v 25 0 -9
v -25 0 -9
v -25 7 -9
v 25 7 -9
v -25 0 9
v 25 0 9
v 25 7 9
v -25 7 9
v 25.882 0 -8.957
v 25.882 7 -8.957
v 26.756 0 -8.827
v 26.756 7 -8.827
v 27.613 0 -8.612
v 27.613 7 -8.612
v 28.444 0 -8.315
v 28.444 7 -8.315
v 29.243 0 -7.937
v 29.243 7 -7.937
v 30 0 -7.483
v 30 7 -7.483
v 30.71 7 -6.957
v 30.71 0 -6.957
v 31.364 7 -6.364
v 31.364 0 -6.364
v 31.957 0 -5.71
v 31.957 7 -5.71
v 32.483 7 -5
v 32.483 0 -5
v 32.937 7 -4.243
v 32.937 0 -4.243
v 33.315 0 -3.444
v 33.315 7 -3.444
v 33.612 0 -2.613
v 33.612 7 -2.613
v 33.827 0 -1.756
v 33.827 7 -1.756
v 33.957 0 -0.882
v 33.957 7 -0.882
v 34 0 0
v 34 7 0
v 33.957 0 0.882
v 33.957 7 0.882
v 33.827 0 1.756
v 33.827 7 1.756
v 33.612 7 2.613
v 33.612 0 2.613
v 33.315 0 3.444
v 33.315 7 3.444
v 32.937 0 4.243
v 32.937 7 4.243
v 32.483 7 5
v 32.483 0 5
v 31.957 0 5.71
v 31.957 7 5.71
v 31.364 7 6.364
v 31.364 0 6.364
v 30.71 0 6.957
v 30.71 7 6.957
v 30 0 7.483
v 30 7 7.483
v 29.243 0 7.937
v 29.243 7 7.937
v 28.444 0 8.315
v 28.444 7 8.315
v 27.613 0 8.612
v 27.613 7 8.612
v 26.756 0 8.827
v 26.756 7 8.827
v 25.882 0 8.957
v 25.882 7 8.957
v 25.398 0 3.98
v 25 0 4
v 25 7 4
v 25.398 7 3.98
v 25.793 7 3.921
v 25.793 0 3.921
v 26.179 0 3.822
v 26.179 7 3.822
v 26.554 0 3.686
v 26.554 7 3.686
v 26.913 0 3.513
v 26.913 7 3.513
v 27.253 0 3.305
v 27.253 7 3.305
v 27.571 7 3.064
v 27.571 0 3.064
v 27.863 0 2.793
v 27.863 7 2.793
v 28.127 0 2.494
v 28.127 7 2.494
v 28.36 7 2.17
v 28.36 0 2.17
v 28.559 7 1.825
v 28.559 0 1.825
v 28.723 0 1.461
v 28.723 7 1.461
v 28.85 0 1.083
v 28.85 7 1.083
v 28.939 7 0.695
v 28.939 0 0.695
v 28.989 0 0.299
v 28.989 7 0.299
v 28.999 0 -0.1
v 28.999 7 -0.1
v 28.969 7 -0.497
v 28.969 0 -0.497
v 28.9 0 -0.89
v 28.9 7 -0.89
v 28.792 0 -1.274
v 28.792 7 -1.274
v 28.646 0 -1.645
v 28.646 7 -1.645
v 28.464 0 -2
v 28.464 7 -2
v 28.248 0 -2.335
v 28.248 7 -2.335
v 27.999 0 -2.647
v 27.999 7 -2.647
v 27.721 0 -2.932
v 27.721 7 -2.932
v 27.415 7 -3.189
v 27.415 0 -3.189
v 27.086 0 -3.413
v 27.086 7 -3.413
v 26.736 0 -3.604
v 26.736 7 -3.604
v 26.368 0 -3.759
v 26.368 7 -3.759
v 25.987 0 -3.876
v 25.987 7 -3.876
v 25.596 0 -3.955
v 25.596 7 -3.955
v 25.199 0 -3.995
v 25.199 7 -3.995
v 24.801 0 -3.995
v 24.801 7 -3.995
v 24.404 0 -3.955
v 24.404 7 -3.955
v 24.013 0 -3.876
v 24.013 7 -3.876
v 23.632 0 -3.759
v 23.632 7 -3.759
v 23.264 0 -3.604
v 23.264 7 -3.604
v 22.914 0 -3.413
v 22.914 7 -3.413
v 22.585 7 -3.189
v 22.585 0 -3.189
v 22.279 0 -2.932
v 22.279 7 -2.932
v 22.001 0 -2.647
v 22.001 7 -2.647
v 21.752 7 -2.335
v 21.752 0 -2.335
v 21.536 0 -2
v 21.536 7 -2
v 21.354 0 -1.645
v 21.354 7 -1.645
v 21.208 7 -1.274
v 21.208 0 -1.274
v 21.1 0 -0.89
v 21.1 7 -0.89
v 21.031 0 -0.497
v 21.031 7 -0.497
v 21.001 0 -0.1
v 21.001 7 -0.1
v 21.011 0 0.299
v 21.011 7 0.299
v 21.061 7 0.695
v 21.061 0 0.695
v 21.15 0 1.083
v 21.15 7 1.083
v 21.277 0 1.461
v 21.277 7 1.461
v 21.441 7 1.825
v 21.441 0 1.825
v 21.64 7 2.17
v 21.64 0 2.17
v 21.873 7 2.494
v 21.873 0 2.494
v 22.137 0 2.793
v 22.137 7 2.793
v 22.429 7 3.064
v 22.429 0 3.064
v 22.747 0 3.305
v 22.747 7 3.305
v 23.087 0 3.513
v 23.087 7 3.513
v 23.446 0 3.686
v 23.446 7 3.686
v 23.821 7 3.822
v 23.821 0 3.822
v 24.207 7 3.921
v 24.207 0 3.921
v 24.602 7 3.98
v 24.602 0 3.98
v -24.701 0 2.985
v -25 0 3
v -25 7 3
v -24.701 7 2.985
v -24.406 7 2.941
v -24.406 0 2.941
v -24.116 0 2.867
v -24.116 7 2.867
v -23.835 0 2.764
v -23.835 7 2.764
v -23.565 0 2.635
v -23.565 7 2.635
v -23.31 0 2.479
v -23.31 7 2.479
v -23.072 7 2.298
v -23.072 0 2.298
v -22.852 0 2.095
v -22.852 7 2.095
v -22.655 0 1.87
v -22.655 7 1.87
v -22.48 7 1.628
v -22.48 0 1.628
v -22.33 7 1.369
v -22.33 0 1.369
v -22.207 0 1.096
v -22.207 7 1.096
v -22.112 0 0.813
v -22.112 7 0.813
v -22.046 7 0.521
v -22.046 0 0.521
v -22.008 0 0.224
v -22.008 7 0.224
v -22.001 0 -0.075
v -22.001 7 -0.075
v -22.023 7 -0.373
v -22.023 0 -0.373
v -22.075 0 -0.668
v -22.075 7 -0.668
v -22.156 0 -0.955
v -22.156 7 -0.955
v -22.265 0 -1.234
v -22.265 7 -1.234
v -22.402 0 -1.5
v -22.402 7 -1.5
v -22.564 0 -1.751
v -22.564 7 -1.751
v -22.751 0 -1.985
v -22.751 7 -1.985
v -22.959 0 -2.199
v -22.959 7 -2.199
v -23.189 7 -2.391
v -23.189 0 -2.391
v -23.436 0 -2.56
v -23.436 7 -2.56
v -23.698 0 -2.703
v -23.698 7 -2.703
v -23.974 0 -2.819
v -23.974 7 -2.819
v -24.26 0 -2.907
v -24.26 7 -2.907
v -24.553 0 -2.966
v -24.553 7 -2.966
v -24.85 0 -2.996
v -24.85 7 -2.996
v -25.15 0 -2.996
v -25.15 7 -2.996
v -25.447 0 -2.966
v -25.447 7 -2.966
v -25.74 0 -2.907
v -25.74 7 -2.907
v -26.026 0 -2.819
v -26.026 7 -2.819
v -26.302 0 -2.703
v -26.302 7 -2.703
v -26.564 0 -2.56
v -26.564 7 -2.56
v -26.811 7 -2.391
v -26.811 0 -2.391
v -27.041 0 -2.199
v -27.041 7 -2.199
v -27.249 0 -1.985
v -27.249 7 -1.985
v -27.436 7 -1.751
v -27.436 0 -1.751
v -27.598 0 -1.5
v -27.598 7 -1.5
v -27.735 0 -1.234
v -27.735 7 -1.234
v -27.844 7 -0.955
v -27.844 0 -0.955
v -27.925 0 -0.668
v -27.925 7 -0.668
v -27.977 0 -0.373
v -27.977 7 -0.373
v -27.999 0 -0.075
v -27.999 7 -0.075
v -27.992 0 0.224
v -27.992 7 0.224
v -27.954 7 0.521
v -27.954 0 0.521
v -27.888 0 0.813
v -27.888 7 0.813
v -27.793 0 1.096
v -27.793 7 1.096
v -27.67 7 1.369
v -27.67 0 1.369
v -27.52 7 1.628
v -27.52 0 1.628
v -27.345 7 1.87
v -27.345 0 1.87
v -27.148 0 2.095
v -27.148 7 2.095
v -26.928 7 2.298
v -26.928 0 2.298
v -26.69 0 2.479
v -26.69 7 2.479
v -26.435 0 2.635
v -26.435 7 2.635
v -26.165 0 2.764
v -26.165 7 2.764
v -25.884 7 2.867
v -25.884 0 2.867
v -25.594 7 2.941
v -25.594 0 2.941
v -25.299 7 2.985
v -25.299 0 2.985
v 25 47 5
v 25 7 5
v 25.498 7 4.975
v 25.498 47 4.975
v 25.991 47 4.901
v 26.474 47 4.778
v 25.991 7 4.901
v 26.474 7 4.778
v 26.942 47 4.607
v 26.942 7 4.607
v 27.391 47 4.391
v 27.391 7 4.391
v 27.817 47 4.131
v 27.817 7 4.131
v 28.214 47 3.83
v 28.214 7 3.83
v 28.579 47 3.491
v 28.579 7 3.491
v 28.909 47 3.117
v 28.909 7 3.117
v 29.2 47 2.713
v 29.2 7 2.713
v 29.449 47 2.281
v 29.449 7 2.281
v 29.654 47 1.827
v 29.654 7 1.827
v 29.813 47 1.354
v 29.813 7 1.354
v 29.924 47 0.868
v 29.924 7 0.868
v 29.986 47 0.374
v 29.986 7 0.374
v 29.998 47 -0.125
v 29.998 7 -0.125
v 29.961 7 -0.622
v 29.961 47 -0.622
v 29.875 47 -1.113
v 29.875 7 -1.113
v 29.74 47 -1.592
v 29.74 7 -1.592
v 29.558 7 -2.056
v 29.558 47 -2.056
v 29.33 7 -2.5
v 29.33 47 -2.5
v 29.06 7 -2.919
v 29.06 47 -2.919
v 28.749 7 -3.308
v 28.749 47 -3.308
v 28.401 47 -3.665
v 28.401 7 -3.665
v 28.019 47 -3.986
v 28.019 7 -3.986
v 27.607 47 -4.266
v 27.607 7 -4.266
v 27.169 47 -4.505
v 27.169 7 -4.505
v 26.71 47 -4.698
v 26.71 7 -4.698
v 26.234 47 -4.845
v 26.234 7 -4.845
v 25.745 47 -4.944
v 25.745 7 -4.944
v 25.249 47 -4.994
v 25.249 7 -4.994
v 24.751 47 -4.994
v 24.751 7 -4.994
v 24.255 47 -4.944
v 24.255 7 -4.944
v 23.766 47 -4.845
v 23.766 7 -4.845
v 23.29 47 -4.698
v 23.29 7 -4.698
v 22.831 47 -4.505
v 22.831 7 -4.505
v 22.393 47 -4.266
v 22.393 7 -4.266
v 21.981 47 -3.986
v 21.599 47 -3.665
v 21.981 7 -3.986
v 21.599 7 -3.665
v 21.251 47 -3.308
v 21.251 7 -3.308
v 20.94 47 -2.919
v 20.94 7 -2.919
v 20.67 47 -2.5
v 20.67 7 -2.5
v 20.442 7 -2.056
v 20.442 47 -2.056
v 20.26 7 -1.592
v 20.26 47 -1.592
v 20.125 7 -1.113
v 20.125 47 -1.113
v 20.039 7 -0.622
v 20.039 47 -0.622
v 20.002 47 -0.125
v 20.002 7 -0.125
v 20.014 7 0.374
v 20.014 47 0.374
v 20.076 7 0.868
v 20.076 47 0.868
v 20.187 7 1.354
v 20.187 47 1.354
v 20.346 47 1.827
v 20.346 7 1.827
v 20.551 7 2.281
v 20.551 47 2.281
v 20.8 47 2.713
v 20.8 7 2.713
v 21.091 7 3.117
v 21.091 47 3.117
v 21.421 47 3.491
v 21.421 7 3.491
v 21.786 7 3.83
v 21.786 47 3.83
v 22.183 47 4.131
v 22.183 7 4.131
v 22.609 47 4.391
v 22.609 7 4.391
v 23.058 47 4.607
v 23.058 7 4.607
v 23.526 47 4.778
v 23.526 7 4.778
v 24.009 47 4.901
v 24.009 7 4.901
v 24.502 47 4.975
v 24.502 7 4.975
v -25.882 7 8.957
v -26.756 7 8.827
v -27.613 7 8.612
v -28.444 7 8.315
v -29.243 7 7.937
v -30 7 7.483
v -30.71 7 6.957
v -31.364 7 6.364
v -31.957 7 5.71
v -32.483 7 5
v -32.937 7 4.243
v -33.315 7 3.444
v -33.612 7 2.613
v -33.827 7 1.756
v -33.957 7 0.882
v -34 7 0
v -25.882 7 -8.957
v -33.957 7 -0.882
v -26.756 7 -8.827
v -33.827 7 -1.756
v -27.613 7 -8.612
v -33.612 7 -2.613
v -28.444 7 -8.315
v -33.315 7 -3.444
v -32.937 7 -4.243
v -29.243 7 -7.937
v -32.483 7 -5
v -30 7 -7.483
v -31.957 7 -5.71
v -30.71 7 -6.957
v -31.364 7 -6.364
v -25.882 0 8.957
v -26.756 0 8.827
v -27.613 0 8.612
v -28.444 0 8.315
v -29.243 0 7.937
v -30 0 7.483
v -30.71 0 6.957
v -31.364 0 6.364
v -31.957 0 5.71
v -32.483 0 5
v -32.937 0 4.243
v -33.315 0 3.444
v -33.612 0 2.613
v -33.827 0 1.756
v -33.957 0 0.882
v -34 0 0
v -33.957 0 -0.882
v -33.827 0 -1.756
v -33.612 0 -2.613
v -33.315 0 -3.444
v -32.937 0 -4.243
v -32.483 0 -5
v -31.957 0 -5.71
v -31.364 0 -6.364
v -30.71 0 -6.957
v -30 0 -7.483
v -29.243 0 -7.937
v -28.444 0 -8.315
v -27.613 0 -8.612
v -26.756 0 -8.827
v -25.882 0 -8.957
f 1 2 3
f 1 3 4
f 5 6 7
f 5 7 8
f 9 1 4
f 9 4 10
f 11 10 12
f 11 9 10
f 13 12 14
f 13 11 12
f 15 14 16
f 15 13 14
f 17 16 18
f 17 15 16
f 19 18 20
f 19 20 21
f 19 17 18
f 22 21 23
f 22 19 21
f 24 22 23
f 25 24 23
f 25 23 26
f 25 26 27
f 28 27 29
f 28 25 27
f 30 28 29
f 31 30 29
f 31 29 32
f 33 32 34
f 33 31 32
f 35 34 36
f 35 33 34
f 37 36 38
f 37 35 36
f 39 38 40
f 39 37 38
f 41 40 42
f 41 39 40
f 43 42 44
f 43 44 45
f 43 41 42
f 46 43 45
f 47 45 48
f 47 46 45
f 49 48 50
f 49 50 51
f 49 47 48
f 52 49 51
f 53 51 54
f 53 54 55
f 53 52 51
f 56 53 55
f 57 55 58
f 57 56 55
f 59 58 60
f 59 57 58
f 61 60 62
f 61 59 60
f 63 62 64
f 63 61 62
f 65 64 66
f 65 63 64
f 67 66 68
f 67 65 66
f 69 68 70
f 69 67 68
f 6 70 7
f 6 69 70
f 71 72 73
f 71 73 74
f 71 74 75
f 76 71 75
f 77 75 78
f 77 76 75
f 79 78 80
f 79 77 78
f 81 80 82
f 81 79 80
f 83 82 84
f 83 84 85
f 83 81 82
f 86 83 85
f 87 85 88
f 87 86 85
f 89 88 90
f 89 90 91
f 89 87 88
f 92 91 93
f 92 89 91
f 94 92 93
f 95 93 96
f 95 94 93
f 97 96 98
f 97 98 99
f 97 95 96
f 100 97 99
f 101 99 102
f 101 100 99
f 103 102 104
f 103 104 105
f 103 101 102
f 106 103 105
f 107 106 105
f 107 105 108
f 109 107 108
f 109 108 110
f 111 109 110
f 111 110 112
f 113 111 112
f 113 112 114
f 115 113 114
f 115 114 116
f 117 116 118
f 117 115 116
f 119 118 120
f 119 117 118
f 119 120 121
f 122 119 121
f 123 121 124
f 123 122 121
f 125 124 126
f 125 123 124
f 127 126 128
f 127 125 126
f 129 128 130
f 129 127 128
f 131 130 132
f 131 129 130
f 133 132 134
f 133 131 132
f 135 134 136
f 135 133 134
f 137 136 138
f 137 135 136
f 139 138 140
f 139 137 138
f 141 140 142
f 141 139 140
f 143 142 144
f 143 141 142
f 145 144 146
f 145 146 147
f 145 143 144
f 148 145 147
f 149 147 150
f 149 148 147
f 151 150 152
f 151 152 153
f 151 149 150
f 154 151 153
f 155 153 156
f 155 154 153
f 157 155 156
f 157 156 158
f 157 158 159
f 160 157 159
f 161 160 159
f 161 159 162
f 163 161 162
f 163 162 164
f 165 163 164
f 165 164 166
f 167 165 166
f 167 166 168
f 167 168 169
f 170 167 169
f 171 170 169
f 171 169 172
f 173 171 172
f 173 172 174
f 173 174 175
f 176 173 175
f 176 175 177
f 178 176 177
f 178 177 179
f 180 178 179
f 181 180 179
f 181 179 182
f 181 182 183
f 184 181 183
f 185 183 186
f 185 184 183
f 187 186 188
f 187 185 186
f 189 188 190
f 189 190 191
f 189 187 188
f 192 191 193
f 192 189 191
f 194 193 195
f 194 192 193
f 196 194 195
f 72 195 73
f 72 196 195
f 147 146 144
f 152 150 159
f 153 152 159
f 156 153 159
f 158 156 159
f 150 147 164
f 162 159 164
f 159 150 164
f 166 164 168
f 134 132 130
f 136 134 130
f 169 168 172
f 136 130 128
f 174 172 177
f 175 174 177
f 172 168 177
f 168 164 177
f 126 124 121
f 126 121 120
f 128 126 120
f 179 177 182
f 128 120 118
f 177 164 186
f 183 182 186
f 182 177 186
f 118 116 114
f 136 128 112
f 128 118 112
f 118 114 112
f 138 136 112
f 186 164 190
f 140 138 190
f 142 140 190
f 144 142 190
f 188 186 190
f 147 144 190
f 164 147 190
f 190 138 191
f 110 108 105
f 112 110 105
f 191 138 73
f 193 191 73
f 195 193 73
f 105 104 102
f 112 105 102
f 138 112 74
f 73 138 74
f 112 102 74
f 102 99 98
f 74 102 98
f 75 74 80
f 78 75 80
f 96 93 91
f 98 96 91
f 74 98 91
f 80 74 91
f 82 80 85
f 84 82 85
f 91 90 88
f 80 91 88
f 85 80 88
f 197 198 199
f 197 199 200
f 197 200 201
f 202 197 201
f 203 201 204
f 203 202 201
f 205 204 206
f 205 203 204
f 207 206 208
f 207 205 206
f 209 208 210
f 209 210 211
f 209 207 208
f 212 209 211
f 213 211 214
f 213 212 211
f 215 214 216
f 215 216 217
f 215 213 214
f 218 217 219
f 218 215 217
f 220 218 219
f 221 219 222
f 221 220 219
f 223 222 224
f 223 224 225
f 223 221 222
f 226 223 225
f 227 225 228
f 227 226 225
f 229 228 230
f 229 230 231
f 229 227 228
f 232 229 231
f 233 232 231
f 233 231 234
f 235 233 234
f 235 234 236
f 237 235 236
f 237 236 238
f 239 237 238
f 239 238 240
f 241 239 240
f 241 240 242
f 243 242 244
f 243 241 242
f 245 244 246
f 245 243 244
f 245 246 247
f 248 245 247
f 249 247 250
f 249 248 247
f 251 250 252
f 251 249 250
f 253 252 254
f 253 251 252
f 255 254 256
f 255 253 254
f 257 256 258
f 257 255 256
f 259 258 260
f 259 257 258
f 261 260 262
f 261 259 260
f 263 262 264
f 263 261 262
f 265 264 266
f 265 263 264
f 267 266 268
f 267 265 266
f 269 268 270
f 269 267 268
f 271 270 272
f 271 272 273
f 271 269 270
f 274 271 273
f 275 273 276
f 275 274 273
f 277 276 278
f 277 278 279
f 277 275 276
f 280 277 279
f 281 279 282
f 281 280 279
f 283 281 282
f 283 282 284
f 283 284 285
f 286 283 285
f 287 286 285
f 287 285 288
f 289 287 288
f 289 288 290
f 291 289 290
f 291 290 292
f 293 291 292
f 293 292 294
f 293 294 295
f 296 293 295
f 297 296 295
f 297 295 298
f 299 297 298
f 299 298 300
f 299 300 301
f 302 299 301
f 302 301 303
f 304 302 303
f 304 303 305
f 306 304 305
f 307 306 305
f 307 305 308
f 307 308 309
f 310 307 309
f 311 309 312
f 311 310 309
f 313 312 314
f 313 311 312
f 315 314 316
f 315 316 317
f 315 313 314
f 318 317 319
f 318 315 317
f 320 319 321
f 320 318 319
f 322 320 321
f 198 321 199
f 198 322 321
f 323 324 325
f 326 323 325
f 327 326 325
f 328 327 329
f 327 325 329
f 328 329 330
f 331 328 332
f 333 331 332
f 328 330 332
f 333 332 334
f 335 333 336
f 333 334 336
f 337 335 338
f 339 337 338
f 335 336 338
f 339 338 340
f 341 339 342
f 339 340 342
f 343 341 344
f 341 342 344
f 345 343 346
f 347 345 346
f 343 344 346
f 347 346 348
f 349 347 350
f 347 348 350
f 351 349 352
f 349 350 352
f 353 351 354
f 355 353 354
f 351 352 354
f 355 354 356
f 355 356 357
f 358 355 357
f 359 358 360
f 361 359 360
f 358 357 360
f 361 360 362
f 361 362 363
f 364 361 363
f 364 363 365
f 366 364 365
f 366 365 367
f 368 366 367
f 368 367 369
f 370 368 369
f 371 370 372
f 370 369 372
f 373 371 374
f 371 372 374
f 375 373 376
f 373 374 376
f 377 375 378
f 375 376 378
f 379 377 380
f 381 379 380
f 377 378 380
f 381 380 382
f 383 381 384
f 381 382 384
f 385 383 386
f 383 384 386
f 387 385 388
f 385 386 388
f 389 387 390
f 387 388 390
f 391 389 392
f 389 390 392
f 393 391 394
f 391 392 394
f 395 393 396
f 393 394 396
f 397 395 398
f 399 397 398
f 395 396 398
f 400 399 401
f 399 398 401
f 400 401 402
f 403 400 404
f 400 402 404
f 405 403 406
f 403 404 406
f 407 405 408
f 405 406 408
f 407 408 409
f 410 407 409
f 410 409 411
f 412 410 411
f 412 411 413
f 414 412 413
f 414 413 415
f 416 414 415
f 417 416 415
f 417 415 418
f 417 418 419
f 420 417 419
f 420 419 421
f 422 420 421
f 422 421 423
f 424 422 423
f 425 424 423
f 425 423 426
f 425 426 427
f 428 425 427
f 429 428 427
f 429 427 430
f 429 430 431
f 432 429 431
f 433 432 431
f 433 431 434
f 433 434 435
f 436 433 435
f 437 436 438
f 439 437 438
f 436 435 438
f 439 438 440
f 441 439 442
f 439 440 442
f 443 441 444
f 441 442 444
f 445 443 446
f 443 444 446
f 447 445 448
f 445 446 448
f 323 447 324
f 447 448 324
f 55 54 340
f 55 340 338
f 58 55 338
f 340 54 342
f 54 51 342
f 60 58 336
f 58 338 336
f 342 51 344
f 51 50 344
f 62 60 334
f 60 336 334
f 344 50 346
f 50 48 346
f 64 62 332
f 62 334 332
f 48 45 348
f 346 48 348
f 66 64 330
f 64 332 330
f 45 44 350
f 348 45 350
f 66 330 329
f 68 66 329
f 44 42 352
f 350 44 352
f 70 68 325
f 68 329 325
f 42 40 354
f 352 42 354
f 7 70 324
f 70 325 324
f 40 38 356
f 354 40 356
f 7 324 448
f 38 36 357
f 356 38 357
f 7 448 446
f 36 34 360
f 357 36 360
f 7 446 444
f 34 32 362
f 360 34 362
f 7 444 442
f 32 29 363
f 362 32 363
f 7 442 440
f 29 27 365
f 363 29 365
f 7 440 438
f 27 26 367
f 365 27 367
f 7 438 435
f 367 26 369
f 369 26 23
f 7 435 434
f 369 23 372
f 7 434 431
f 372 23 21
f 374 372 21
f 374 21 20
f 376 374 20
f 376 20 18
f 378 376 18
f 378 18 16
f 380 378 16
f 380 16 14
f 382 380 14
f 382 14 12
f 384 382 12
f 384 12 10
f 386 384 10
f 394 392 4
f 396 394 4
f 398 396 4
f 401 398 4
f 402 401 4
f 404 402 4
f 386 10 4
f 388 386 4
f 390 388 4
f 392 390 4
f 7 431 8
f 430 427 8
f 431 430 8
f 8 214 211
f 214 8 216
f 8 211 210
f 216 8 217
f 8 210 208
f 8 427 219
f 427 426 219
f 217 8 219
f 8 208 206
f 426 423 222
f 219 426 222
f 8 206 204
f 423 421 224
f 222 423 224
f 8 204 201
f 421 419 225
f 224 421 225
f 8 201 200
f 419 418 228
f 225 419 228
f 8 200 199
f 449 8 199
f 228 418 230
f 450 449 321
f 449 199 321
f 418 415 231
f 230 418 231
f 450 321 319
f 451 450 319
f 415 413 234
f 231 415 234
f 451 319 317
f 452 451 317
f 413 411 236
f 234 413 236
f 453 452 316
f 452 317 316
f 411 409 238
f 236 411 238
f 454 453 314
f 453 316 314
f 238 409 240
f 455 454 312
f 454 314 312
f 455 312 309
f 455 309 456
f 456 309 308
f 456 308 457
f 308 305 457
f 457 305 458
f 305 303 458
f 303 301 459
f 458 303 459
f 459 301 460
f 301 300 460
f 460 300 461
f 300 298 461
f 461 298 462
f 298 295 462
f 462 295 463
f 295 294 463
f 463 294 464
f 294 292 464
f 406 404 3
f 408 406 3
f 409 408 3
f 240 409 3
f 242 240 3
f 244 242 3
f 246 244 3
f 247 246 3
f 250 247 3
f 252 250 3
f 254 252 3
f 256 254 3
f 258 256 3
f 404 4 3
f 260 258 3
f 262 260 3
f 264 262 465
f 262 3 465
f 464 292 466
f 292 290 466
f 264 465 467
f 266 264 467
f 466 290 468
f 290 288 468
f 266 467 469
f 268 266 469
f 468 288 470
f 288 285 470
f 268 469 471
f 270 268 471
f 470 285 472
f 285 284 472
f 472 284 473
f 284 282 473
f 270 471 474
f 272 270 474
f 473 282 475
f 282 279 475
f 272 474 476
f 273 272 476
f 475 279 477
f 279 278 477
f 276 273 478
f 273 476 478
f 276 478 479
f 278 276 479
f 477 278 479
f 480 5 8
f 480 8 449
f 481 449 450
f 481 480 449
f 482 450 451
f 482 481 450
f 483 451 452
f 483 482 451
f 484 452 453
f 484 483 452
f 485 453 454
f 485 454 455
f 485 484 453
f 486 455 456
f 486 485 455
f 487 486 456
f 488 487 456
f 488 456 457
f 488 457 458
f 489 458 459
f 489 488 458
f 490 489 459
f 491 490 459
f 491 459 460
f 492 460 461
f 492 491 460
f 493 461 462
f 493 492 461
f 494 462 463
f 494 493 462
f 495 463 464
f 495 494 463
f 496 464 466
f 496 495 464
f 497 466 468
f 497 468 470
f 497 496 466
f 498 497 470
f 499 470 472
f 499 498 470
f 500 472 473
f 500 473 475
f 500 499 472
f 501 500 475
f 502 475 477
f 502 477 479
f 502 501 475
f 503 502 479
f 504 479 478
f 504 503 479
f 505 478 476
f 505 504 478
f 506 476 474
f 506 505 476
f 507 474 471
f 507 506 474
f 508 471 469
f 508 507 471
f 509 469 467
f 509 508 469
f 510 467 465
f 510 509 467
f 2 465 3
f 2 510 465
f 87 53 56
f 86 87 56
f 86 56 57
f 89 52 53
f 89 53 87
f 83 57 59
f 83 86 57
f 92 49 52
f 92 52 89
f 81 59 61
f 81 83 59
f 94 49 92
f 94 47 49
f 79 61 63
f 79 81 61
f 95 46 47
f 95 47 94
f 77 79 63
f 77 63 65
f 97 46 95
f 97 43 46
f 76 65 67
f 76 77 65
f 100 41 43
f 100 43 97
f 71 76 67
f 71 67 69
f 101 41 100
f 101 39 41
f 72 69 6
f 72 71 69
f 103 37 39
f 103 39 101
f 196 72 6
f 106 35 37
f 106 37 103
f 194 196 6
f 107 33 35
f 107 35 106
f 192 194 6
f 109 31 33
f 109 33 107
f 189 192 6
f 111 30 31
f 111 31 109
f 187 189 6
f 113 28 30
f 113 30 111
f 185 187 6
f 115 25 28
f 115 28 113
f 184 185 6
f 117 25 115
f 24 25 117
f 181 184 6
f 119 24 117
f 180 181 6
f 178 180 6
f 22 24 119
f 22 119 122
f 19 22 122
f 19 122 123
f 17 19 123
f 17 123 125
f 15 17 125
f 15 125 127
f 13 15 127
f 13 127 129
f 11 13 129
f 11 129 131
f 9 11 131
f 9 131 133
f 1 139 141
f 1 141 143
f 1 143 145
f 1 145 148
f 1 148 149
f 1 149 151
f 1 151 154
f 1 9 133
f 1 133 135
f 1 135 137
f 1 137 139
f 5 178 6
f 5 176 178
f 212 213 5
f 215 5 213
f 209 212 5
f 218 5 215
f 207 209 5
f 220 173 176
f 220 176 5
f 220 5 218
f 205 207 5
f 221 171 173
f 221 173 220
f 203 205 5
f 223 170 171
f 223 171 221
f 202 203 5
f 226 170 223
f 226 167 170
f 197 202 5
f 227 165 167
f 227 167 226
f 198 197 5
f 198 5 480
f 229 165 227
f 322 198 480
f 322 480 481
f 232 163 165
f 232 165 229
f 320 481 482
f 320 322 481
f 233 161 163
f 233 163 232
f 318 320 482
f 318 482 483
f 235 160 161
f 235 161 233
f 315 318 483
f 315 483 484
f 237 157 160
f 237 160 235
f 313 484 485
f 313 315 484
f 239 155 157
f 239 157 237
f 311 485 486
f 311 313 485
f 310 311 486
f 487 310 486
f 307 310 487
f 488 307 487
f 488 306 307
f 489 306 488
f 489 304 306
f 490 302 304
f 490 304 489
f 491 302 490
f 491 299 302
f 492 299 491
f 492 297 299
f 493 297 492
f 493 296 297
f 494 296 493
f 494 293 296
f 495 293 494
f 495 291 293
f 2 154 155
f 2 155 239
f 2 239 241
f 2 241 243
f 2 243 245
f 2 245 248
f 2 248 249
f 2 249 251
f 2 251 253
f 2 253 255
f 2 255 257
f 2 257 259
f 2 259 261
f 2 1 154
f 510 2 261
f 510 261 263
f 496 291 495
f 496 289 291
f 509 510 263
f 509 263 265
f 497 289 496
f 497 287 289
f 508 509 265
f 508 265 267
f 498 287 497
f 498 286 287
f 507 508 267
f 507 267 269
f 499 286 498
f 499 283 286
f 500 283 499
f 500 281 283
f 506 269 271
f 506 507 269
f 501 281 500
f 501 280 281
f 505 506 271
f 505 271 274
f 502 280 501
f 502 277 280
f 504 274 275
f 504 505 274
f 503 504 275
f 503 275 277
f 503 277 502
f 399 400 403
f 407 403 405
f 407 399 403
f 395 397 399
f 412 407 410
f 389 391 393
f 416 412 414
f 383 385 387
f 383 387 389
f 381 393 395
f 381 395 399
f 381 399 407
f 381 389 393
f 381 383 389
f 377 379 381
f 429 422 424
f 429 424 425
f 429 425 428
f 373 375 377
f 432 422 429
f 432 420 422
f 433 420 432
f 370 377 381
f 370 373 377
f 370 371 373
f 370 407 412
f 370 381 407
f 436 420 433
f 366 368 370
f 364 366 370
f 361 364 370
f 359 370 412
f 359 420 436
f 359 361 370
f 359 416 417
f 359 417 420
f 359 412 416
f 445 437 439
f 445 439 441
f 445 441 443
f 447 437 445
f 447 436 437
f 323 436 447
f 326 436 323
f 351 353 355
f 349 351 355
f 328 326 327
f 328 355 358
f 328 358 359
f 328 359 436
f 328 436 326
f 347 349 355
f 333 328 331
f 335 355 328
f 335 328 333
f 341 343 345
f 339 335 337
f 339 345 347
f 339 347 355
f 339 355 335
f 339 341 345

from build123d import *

# Parameters (mm, degrees)
SKETCH1_R           = 4
SKETCH1_R_2         = 3
BOSS_EXTRUDE1_DEPTH = 7
SKETCH2_R           = 5
BOSS_EXTRUDE2_DEPTH = 40


with BuildPart() as part:
    # Sketch1 → Boss-Extrude1 (new body)
    with BuildSketch(Plane(origin=(0, 0, 0), x_dir=(1, 0, 0), z_dir=(0, 1, 0))):
        with BuildLine():
            Line((-25, 9), (25, 9))
            ThreePointArc((25, 9), (34, 0), (25, -9))
            Line((25, -9), (-25, -9))
            ThreePointArc((-25, -9), (-34, 0), (-25, 9))
        make_face()
        with Locations(Location((25, 0, 0), (0, 0, 270))):  # turned: the seam where the file's is
            Circle(SKETCH1_R, mode=Mode.SUBTRACT)
        with Locations(Location((-25, 0, 0), (0, 0, 270))):  # turned: the seam where the file's is
            Circle(SKETCH1_R_2, mode=Mode.SUBTRACT)
    extrude(amount=BOSS_EXTRUDE1_DEPTH)

    # Sketch2 → Boss-Extrude2 (add)
    with BuildSketch(Plane(origin=(0, 7, 0), x_dir=(1, 0, 0), z_dir=(0, 1, 0))):
        with Locations(Location((25, 0, 0), (0, 0, 270))):  # turned: the seam where the file's is
            Circle(SKETCH2_R)
    extrude(amount=BOSS_EXTRUDE2_DEPTH)


solid = part.part
